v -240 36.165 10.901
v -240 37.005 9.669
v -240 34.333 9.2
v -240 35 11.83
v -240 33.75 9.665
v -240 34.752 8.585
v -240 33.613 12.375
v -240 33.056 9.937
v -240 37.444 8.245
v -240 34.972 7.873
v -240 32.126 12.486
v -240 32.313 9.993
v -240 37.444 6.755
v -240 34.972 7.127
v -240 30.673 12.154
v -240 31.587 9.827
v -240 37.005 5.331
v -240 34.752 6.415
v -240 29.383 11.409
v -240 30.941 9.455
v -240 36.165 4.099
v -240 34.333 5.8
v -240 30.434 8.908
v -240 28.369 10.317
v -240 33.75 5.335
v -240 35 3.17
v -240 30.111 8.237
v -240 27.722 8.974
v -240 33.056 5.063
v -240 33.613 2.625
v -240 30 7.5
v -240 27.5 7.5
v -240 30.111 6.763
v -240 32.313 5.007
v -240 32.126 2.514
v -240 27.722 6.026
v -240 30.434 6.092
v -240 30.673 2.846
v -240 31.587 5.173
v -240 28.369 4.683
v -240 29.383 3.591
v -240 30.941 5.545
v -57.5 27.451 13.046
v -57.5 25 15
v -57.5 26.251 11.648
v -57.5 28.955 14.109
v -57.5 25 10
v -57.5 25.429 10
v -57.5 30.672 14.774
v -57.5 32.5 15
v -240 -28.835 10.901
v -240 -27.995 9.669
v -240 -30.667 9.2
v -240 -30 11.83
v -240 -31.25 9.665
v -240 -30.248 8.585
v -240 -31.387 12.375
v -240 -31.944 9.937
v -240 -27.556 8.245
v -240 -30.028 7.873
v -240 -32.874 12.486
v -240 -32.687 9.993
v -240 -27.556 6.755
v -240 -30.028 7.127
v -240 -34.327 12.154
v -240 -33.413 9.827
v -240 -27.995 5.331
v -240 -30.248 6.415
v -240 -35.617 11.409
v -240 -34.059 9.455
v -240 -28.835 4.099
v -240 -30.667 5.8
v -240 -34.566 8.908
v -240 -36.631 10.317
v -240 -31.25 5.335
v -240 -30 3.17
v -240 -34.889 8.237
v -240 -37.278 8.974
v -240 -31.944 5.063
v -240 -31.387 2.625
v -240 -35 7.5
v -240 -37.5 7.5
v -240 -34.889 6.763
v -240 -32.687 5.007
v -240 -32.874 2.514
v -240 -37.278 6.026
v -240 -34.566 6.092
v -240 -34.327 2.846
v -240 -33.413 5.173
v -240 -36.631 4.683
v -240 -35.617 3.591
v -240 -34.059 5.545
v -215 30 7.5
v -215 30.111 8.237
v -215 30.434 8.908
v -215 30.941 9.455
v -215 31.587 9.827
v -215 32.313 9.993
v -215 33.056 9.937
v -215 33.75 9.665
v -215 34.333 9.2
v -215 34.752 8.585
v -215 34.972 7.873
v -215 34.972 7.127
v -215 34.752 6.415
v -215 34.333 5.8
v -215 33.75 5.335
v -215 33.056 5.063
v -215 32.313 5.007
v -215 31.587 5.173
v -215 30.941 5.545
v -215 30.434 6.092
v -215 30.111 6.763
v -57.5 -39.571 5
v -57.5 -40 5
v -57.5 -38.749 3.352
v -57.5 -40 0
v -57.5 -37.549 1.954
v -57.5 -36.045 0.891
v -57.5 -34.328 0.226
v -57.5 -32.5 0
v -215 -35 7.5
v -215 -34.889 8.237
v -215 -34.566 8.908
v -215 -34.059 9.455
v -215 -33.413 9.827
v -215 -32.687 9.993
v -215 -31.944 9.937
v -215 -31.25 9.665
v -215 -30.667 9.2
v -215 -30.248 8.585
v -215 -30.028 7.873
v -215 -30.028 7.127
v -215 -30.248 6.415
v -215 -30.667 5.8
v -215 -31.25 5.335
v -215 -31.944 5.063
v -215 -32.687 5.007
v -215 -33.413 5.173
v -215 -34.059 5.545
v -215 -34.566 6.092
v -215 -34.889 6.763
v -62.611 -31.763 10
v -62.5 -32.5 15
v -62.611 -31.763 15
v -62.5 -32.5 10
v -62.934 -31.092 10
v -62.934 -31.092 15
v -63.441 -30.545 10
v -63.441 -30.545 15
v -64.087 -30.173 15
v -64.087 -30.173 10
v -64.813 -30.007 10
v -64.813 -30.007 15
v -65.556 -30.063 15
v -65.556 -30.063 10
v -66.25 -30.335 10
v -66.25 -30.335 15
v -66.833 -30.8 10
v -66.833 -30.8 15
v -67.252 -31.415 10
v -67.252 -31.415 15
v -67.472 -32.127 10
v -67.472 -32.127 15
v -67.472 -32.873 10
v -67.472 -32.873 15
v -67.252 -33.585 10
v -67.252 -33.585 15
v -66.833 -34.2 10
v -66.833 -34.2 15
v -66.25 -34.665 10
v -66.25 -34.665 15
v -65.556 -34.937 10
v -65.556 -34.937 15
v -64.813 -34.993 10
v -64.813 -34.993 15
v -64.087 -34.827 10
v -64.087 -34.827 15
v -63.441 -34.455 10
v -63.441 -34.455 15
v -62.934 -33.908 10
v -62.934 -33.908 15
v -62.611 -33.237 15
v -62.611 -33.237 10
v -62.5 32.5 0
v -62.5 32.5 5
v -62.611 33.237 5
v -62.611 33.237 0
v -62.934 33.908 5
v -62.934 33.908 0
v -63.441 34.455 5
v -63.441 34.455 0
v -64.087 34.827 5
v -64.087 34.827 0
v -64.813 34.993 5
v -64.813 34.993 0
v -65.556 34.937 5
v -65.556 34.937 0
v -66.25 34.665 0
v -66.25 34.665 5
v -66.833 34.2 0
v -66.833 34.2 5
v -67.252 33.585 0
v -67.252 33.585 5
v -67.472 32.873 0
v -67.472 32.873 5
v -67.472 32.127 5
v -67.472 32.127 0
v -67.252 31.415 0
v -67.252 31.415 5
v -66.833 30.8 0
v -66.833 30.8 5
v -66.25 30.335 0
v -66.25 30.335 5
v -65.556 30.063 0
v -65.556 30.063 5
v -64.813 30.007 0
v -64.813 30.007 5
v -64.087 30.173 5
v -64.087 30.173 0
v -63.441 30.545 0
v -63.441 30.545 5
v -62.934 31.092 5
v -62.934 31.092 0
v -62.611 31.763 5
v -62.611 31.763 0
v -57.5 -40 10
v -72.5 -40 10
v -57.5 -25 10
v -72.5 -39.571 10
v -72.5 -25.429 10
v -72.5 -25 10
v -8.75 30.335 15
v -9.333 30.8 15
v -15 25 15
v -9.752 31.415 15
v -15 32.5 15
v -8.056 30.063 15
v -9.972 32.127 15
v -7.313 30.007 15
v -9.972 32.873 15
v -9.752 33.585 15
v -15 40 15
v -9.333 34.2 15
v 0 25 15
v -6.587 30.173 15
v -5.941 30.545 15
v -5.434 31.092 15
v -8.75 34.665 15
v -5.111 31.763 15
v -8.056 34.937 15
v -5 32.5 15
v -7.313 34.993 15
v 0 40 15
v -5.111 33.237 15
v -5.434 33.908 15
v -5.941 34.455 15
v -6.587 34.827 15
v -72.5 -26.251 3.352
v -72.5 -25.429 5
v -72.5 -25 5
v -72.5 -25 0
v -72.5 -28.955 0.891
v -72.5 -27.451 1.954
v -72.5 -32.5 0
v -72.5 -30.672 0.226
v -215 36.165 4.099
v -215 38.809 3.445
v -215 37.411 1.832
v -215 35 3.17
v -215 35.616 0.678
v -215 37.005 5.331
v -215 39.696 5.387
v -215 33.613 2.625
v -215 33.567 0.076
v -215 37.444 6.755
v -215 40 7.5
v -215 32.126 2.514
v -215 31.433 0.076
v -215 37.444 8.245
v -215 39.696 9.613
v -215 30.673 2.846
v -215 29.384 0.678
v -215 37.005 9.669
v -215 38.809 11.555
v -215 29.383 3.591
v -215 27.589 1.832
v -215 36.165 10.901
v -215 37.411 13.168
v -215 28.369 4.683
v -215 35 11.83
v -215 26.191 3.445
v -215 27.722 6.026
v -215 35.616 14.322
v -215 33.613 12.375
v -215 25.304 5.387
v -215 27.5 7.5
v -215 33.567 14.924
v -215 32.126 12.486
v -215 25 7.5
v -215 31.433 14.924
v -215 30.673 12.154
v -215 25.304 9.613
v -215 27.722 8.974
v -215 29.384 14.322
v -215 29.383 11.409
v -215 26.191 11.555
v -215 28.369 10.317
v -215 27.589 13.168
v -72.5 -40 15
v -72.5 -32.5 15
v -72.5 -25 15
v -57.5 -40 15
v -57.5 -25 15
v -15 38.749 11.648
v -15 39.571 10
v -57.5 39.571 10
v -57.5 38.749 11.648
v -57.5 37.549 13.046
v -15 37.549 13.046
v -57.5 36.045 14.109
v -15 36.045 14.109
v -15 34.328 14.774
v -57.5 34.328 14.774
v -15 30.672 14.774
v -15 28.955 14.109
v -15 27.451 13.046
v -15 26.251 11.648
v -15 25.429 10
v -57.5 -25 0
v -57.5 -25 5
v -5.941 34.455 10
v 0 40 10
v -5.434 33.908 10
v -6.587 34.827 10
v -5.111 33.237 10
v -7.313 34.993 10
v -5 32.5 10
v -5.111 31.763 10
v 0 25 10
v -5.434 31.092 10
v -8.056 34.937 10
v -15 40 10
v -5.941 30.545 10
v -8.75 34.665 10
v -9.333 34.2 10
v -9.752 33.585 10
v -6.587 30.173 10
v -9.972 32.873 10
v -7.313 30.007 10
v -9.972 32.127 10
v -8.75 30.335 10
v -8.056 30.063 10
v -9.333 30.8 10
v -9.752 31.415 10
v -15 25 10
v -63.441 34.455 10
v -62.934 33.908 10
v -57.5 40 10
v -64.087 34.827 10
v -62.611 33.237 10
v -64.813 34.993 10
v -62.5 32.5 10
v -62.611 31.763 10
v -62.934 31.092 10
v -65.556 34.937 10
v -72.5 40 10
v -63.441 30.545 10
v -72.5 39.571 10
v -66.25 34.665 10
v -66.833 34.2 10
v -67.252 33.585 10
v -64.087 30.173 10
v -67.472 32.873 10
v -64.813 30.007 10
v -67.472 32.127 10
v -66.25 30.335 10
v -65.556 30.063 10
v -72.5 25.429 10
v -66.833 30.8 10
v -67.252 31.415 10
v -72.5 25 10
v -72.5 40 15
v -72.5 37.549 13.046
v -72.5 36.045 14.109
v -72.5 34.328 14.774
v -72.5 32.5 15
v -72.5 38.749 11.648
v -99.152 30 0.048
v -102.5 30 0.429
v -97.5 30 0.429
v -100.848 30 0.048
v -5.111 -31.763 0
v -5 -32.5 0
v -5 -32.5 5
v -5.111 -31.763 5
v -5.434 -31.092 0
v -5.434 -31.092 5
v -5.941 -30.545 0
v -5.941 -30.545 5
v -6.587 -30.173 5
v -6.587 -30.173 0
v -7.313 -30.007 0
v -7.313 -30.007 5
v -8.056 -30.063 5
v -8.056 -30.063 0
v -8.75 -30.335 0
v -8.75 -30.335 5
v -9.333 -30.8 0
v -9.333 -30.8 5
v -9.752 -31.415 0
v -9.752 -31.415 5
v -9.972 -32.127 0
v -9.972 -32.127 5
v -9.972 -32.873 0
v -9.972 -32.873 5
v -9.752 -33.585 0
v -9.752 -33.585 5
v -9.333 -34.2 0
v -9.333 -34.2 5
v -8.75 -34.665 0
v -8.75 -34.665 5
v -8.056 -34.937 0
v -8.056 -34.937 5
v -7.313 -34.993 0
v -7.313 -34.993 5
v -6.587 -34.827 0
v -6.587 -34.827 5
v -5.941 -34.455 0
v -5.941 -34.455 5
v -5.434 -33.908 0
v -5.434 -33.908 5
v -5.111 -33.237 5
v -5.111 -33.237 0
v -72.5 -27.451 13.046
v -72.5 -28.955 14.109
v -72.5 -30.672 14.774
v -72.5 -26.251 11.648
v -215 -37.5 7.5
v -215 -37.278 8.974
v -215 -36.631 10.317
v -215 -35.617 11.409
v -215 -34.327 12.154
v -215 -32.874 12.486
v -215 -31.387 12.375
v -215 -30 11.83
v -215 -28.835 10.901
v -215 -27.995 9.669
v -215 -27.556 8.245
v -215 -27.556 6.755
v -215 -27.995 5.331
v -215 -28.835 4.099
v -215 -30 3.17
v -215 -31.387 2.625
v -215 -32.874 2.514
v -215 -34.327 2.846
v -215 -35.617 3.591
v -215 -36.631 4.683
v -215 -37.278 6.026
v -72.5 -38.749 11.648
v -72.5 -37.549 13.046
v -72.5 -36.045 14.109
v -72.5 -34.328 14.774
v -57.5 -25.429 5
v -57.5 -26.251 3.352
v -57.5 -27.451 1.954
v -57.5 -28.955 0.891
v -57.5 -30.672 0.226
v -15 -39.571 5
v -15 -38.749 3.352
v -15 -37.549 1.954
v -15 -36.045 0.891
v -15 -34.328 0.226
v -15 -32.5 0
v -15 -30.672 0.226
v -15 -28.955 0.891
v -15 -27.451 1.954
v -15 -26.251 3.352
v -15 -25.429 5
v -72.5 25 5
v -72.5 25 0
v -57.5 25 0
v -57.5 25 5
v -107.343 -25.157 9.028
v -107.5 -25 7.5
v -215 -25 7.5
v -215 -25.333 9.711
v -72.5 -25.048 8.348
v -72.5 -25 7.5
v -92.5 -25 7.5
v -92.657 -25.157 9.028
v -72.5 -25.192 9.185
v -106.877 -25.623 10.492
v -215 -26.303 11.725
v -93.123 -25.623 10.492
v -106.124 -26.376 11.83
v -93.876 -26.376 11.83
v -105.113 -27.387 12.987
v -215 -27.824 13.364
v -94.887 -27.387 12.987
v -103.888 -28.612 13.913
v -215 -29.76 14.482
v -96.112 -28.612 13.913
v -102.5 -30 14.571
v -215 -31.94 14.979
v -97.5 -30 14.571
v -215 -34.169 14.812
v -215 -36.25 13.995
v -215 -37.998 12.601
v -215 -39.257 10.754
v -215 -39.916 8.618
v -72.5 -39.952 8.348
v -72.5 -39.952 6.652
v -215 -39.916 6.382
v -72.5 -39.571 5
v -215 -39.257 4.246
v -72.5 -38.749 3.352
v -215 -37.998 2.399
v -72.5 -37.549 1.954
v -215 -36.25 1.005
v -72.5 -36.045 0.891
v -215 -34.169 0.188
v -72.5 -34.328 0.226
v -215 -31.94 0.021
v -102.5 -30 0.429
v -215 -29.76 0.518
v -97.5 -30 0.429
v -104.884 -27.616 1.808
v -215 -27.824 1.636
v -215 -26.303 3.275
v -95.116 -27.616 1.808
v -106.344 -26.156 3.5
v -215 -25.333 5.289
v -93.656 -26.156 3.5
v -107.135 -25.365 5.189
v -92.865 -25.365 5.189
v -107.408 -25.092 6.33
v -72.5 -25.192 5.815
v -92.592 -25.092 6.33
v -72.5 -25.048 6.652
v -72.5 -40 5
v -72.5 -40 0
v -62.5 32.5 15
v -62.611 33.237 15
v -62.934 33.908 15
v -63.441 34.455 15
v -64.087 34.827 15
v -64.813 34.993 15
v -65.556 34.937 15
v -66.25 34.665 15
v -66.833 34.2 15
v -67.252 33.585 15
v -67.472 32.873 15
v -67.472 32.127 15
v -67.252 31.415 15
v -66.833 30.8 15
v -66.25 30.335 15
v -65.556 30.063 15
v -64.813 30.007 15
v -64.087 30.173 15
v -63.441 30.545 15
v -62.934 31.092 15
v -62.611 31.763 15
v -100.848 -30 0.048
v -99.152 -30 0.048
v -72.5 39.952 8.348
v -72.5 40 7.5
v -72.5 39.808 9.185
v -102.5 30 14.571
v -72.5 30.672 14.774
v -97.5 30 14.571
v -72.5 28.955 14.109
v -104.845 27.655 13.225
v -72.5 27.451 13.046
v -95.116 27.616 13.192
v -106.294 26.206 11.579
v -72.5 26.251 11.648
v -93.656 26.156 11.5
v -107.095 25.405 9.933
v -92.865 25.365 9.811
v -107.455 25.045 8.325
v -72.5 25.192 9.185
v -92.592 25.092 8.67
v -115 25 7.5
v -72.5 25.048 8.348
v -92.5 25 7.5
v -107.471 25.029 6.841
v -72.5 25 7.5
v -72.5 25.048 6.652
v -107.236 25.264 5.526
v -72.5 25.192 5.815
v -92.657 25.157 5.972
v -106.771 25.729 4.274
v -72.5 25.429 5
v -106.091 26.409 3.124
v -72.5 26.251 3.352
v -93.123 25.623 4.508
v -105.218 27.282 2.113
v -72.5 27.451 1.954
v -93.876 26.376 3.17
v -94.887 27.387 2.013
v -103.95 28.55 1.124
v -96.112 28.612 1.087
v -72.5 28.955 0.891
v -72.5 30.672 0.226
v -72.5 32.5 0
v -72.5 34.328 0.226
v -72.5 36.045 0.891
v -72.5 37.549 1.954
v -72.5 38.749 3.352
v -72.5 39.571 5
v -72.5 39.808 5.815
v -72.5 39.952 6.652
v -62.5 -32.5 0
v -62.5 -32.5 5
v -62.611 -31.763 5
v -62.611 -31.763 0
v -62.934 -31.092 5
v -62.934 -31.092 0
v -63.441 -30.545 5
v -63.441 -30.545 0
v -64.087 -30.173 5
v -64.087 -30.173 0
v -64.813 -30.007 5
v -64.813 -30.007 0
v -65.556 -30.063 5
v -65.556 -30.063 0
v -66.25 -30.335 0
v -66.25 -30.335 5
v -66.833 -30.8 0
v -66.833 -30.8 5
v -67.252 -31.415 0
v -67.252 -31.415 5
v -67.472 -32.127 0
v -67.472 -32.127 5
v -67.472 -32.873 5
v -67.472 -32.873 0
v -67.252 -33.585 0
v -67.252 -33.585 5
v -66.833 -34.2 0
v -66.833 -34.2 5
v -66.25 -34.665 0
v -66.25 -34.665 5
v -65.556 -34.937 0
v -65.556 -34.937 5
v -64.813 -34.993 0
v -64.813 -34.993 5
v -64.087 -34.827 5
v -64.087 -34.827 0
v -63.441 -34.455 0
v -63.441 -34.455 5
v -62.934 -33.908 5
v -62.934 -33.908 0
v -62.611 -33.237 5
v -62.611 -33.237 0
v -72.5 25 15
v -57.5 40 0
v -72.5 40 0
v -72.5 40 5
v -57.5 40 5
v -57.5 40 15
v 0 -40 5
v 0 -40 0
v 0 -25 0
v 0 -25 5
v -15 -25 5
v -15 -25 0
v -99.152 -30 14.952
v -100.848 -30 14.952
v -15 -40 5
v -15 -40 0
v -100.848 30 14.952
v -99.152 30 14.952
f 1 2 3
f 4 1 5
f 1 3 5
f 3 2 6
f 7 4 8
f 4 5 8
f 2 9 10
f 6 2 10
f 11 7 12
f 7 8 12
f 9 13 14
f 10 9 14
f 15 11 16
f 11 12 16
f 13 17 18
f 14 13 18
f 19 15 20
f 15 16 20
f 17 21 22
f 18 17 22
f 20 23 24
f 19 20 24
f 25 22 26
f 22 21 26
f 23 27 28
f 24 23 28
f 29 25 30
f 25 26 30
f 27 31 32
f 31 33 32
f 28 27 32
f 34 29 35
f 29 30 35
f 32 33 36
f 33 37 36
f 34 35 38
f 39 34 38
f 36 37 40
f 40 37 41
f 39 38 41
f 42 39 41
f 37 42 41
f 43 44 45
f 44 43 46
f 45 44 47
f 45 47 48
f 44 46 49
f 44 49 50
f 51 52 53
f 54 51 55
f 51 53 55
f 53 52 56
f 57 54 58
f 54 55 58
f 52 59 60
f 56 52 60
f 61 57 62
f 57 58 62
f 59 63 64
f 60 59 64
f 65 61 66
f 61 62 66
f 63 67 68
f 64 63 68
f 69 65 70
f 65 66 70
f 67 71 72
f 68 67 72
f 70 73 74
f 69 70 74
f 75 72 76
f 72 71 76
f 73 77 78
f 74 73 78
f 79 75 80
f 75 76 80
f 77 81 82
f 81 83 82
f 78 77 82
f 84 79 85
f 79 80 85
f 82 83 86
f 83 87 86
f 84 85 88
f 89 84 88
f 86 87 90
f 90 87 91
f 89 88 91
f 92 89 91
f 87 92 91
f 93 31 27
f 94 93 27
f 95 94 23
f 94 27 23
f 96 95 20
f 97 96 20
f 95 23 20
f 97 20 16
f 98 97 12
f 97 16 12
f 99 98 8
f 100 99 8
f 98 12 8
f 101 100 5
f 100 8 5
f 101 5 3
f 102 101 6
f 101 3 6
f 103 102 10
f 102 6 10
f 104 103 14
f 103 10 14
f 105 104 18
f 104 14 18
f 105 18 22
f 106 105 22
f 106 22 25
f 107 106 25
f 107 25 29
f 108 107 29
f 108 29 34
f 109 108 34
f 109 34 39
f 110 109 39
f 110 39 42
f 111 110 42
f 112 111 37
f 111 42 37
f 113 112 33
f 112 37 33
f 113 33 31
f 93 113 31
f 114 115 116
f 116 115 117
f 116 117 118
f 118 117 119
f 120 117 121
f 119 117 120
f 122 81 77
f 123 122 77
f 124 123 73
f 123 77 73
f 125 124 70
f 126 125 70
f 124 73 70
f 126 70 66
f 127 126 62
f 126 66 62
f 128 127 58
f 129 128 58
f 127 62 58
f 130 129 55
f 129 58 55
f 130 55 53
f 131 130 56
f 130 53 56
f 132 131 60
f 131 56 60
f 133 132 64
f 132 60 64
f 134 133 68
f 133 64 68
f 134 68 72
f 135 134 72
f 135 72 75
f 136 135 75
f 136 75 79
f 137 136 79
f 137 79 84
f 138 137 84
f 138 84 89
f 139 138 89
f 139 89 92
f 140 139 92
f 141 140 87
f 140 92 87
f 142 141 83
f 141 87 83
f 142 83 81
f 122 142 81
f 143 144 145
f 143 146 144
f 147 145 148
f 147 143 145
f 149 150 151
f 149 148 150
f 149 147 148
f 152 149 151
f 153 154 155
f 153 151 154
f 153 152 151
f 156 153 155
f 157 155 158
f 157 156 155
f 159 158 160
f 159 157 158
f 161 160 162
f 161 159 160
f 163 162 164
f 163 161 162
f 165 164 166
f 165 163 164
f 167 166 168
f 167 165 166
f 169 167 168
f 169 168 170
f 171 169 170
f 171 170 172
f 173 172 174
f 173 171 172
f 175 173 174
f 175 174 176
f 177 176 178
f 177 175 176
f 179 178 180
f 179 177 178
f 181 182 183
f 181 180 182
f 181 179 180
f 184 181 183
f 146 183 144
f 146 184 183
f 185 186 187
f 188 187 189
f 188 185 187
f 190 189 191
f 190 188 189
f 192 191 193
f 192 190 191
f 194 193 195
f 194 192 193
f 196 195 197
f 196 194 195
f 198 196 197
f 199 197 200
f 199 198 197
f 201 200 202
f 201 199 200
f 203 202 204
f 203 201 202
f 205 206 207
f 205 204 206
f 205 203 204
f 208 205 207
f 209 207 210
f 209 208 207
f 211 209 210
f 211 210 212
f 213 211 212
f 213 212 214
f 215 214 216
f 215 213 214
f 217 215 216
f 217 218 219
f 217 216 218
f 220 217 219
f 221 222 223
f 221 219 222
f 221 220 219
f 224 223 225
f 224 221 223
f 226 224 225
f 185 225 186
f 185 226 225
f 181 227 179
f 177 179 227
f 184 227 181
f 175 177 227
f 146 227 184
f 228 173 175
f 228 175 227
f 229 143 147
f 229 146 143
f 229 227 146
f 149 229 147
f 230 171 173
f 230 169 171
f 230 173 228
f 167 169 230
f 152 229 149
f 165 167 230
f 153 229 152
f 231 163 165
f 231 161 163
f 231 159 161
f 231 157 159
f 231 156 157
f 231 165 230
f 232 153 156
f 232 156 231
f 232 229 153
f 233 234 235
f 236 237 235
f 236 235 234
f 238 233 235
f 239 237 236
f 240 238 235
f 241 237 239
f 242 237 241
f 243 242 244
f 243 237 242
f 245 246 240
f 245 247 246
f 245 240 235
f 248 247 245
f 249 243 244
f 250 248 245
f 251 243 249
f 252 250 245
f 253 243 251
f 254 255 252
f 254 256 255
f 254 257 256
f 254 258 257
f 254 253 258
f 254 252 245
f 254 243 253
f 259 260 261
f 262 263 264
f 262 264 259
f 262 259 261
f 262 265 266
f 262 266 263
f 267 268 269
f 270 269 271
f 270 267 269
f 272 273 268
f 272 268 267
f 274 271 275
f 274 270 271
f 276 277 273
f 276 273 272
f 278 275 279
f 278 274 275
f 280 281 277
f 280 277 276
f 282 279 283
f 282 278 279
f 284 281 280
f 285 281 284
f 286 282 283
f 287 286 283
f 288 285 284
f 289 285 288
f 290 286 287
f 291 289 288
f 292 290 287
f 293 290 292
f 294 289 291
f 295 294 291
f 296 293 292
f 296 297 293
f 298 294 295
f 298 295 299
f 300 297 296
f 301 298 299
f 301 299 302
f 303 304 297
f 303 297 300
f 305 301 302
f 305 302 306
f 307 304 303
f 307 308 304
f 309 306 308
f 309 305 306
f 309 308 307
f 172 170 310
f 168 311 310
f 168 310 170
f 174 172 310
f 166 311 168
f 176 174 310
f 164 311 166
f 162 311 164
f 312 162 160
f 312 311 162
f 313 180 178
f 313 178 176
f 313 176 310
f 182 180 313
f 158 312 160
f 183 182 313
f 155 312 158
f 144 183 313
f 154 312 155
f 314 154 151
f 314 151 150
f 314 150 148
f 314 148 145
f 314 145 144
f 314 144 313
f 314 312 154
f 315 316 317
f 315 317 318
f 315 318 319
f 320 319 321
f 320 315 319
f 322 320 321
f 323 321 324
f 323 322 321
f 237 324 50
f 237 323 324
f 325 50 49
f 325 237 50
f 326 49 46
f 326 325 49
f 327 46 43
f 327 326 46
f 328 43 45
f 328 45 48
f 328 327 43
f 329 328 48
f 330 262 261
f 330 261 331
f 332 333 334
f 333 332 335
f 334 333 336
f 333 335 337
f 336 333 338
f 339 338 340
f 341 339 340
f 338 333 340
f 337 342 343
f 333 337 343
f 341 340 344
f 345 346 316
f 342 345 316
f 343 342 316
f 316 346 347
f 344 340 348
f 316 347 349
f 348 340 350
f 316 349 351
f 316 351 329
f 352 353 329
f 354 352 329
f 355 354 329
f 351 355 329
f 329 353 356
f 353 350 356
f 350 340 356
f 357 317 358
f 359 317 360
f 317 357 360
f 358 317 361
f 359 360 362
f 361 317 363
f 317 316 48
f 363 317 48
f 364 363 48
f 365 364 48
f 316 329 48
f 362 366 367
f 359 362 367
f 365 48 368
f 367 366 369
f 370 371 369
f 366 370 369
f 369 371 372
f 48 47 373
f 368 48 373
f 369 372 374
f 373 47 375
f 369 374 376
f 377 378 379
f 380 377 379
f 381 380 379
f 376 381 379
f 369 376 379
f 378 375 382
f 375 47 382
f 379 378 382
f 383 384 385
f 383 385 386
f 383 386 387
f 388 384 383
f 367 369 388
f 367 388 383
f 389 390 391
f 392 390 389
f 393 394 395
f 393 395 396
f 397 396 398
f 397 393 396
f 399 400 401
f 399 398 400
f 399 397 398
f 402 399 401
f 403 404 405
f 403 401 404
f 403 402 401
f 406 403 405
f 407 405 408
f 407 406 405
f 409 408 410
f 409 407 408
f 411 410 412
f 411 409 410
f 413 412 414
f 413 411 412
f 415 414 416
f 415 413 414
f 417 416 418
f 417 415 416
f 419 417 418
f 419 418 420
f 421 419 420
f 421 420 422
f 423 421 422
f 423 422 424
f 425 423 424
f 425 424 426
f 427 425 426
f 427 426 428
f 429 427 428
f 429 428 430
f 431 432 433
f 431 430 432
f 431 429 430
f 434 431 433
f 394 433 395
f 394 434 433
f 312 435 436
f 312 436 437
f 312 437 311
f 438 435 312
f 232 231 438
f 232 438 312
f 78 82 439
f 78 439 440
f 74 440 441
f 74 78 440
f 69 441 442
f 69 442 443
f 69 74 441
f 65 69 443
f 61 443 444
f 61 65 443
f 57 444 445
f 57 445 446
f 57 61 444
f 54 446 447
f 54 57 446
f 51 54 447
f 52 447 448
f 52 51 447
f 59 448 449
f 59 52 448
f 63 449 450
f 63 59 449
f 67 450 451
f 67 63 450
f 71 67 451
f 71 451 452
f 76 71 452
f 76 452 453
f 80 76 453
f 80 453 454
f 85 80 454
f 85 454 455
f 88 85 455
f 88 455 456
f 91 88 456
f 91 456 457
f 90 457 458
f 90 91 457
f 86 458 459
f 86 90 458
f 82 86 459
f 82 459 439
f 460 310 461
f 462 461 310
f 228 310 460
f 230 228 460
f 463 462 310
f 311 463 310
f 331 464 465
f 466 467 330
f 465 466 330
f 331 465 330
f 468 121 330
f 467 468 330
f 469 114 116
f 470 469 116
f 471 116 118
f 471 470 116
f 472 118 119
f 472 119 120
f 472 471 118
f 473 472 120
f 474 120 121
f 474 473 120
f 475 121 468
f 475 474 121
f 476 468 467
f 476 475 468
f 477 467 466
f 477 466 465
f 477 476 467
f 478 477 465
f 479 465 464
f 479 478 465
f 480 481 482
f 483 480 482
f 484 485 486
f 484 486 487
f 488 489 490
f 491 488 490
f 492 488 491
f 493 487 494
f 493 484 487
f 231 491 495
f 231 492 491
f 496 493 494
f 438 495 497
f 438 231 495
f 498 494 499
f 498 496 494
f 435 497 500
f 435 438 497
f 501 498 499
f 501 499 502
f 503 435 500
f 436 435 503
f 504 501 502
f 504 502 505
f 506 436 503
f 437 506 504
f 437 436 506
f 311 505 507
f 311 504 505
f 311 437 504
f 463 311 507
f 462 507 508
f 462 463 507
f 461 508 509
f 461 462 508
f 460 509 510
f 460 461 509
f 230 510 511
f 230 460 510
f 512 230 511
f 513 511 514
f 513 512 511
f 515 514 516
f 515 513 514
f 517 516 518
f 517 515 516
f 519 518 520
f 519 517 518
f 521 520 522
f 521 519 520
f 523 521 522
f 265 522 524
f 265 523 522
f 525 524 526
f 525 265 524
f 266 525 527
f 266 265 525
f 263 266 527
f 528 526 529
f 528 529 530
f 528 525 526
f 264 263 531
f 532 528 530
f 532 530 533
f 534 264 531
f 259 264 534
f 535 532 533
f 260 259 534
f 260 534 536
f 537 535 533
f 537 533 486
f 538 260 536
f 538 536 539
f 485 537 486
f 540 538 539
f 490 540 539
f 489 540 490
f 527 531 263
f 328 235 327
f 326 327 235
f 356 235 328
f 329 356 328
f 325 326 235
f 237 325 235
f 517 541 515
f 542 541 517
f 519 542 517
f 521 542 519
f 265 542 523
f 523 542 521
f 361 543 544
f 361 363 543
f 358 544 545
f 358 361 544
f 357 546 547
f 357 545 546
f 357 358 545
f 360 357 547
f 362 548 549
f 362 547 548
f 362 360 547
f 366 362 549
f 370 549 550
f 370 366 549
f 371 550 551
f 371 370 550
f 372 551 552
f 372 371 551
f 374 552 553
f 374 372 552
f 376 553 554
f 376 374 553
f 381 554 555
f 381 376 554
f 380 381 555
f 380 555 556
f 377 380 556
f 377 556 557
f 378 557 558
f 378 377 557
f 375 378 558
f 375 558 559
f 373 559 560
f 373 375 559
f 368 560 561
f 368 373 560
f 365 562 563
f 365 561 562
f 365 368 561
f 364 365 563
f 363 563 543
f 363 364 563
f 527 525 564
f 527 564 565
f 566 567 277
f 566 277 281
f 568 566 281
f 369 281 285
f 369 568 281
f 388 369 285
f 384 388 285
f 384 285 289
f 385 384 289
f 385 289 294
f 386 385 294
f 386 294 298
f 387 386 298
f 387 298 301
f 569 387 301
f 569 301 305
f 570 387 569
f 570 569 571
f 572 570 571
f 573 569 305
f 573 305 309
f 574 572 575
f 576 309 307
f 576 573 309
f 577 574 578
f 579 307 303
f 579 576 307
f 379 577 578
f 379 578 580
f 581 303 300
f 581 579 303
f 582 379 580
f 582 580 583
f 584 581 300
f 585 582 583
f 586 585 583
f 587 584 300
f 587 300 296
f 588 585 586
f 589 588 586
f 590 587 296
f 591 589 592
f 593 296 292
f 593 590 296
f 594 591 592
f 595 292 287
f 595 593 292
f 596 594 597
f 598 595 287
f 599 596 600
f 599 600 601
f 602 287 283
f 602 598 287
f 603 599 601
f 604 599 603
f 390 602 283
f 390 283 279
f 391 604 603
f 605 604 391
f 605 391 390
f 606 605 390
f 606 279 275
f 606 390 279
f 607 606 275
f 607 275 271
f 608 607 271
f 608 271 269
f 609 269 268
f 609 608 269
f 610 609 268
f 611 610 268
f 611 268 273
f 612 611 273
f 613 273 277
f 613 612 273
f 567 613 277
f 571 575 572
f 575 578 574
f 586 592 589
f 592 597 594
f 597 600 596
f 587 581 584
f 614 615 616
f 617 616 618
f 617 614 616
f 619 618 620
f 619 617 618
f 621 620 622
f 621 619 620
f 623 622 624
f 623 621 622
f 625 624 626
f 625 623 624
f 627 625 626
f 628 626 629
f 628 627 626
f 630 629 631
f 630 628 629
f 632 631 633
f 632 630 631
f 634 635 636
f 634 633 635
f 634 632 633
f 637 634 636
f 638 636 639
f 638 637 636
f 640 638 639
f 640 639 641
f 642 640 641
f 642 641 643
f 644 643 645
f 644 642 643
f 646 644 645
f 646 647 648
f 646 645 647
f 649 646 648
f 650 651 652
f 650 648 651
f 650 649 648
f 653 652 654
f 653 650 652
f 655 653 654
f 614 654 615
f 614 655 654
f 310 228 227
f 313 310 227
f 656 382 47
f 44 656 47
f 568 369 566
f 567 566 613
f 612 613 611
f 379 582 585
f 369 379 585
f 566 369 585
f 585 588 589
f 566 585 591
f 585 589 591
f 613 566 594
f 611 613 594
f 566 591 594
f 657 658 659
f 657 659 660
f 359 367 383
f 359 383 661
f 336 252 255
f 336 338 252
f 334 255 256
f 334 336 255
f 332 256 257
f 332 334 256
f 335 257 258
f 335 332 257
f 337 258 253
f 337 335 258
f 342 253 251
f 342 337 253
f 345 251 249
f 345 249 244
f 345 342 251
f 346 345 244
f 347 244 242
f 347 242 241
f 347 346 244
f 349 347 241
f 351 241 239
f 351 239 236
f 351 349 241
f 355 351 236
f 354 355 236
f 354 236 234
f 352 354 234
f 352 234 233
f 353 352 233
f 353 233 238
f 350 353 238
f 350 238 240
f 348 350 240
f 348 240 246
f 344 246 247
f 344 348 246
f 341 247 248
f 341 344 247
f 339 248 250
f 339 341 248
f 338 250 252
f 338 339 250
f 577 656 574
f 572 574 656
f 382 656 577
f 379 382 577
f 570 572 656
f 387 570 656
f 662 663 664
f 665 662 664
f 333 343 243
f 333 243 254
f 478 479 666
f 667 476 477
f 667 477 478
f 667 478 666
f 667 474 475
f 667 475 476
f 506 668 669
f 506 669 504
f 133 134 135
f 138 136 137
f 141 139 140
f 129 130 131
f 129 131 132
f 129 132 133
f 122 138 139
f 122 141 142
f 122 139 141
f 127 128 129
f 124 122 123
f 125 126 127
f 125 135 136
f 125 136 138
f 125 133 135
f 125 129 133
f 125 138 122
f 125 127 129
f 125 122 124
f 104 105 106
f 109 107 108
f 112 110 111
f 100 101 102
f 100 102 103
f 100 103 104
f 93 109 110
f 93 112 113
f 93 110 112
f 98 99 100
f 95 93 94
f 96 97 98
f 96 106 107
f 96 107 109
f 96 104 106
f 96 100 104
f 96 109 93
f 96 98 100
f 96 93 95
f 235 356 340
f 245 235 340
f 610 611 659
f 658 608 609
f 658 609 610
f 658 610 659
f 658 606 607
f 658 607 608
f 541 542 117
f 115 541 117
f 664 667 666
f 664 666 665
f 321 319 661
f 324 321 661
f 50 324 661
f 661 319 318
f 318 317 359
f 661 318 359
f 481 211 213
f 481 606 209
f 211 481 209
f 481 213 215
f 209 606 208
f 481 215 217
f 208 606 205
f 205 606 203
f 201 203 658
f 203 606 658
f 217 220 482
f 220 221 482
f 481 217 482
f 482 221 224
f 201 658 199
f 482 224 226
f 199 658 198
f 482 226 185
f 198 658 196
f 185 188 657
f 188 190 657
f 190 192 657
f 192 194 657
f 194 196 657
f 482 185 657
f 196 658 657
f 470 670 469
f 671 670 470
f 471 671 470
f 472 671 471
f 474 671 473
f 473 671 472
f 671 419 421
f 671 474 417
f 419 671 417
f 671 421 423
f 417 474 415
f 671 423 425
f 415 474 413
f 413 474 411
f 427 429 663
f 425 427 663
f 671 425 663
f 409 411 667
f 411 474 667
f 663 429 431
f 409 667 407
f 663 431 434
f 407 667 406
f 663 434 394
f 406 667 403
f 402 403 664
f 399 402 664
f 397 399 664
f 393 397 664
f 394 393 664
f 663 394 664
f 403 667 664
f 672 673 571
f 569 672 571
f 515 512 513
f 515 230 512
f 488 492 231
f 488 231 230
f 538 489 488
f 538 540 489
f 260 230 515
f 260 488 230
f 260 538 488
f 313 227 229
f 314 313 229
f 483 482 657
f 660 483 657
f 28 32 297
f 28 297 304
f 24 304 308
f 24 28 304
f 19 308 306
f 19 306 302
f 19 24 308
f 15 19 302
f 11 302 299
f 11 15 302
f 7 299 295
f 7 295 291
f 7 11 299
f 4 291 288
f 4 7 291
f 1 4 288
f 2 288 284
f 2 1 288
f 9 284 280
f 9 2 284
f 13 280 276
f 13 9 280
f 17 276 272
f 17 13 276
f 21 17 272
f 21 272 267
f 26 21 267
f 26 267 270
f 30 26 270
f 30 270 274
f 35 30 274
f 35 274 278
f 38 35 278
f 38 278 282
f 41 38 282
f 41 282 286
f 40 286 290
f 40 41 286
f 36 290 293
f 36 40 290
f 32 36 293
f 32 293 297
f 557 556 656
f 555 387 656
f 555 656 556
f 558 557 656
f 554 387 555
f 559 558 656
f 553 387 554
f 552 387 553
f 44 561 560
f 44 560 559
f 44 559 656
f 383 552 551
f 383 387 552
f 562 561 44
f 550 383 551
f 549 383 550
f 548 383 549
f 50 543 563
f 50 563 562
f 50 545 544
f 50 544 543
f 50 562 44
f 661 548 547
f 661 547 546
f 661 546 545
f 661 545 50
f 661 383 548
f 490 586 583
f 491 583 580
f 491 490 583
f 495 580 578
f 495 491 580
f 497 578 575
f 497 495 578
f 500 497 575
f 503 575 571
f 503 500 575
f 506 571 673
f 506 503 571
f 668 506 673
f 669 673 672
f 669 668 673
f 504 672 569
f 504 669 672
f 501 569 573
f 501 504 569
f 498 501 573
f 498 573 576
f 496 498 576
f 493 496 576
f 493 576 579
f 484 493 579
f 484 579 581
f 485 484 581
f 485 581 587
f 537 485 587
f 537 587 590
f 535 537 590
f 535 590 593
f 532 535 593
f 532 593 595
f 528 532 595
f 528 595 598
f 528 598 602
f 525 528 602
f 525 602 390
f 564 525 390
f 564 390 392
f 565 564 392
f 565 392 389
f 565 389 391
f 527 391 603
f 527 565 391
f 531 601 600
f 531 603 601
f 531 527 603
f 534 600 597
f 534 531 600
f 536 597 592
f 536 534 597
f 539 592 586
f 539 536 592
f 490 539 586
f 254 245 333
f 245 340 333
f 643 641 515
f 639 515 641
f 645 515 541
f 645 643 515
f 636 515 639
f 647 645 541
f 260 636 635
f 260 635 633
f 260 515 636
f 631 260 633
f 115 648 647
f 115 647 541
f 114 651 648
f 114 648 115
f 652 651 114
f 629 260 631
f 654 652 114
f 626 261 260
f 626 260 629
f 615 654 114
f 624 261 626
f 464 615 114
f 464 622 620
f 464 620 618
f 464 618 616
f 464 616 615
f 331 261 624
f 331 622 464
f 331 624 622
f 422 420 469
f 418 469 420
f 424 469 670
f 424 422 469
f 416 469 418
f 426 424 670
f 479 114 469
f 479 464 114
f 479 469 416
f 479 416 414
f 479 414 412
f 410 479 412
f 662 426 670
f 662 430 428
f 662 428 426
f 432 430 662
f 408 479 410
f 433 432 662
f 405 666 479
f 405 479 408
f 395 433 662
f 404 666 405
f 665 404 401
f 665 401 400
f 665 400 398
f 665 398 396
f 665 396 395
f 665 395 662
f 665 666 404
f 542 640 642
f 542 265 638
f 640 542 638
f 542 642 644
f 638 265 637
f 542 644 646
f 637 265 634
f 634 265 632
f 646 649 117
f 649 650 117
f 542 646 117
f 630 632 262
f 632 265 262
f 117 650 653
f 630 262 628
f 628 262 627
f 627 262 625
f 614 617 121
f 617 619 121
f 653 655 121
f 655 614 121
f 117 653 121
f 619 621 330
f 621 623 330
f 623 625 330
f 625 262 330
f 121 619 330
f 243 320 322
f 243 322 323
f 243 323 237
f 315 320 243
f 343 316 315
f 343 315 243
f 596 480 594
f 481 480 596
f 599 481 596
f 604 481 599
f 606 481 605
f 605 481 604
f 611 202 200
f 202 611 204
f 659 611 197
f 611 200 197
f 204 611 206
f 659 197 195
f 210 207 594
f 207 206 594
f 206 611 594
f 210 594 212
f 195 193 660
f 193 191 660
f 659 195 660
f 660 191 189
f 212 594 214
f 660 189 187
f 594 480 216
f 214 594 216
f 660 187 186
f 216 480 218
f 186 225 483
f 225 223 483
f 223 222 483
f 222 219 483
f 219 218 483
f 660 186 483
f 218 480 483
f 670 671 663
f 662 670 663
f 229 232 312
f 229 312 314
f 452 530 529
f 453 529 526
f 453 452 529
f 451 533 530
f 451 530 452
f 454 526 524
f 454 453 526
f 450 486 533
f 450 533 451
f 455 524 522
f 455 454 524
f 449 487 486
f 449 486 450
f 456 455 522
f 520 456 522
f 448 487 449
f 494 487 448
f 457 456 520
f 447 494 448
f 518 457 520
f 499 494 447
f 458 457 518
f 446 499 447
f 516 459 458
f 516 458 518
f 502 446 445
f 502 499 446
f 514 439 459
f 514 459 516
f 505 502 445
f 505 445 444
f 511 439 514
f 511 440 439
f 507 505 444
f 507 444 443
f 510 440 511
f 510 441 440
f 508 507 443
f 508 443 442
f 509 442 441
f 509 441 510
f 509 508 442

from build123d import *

# Parameters (mm, degrees)
F1_DEPTH      = 15
F2_R          = 7.5
F3_DEPTH      = 240
F4_R          = 7.5
F5_DEPTH      = 30
F5_DEPTH_BACK = 30
F6_W          = 15
F6_H          = 15
F7_DEPTH      = 15
F9_DEPTH      = 40.1
F11_DEPTH     = 54.1
F12_R         = 2.5
F13_DEPTH     = 25
F15_R         = 2.5
F16_DEPTH     = 25
F18_DEPTH     = 25
F17_R         = 7.5
F17_R_2       = 5
F19_DEPTH     = 25


# Not quite as in the source:
# - a feature names something its author has since deleted; it is built from what else it names


with BuildPart() as f1:
    # F0 (on Top) → F1 (new body)
    with BuildSketch(Plane.XY):
        Polygon((-240, -25), (-240, -40), (0, -40), (0, -25), (-100, -25), (-100, 25), (0, 25), (0, 40), (-240, 40), (-240, 25), (-115, 25), (-115, -25), align=None)
    extrude(amount=F1_DEPTH)

    # F2 (on Right) → F3 (intersect)
    with BuildSketch(Plane.YZ):
        with Locations((-32.5, 7.5)):
            Circle(F2_R)
        with Locations((32.5, 7.5)):
            Circle(F2_R)
    extrude(amount=-F3_DEPTH, mode=Mode.INTERSECT)

    # F4 (on Front) → F5 (join, two sides)
    with BuildSketch(Plane.XZ) as f5_sk:
        with Locations((-100, 7.5)):
            Circle(F4_R)
    extrude(amount=F5_DEPTH)
    extrude(f5_sk.sketch, amount=-F5_DEPTH_BACK)

    # F6 (on Top) → F7 (join)
    with BuildSketch(Plane.XY):
        with Locations((-65, 32.5)):
            Rectangle(F6_W, F6_H)
        with Locations((-65, -32.5)):
            Rectangle(F6_W, F6_H)
        with Locations((-7.5, 32.5)):
            Rectangle(F6_W, F6_H)
        with Locations((-7.5, -32.5)):
            Rectangle(F6_W, F6_H)
    extrude(amount=F7_DEPTH)

    # F8 (on Front) → F9 (cut)
    with BuildSketch(Plane.XZ):
        Polygon((0, 0), (0, 10), (-72.5, 10), (-72.5, 5), (-57.5, 5), (-57.5, 0), align=None)
    extrude(amount=-F9_DEPTH, mode=Mode.SUBTRACT)

    # F10 (on Front) → F11 (cut)
    with BuildSketch(Plane.XZ):
        Polygon((0, 5), (0, 15), (-57.5, 15), (-57.5, 10), (-72.5, 10), (-72.5, 5), (-57.5, 5), align=None)
    extrude(amount=F11_DEPTH, mode=Mode.SUBTRACT)

    # F12 (on Top) → F13 (cut)
    with BuildSketch(Plane.XY):
        with Locations((-65, 32.5)):
            Circle(F12_R)
        with Locations((-65, -32.5)):
            Circle(F12_R)
        with Locations((-7.5, -32.5)):
            Circle(F12_R)
        with Locations((-7.5, 32.5)):
            Circle(F12_R)
    extrude(amount=F13_DEPTH, mode=Mode.SUBTRACT)

    # F15 (on offset) → F16 (cut)
    with BuildSketch(Plane(origin=(-240, 0, 0), x_dir=(0, -1, 0), z_dir=(-1, 0, 0))):
        with Locations((-32.5, 7.5)):
            Circle(F15_R)
        with Locations((32.5, 7.5)):
            Circle(F15_R)
    extrude(amount=-F16_DEPTH, mode=Mode.SUBTRACT)

    # F0 (on Top) → F18 (cut)
    with BuildSketch(Plane.XY):
        Polygon((-240, -25), (-240, -40), (0, -40), (0, -25), (-100, -25), (-100, 25), (0, 25), (0, 40), (-240, 40), (-240, 25), (-115, 25), (-115, -25), align=None)
    extrude(amount=-F18_DEPTH, mode=Mode.SUBTRACT)

    # F17 (on offset) → F19 (cut)
    with BuildSketch(Plane(origin=(-240, 0, 0), x_dir=(0, -1, 0), z_dir=(-1, 0, 0))):
        with Locations((-32.5, 7.5)):
            Circle(F17_R)
        with Locations((-32.5, 7.5)):
            Circle(F17_R_2, mode=Mode.SUBTRACT)
        with Locations((32.5, 7.5)):
            Circle(F17_R)
        with Locations((32.5, 7.5)):
            Circle(F17_R_2, mode=Mode.SUBTRACT)
    extrude(amount=-F19_DEPTH, mode=Mode.SUBTRACT)


solid = f1.part
